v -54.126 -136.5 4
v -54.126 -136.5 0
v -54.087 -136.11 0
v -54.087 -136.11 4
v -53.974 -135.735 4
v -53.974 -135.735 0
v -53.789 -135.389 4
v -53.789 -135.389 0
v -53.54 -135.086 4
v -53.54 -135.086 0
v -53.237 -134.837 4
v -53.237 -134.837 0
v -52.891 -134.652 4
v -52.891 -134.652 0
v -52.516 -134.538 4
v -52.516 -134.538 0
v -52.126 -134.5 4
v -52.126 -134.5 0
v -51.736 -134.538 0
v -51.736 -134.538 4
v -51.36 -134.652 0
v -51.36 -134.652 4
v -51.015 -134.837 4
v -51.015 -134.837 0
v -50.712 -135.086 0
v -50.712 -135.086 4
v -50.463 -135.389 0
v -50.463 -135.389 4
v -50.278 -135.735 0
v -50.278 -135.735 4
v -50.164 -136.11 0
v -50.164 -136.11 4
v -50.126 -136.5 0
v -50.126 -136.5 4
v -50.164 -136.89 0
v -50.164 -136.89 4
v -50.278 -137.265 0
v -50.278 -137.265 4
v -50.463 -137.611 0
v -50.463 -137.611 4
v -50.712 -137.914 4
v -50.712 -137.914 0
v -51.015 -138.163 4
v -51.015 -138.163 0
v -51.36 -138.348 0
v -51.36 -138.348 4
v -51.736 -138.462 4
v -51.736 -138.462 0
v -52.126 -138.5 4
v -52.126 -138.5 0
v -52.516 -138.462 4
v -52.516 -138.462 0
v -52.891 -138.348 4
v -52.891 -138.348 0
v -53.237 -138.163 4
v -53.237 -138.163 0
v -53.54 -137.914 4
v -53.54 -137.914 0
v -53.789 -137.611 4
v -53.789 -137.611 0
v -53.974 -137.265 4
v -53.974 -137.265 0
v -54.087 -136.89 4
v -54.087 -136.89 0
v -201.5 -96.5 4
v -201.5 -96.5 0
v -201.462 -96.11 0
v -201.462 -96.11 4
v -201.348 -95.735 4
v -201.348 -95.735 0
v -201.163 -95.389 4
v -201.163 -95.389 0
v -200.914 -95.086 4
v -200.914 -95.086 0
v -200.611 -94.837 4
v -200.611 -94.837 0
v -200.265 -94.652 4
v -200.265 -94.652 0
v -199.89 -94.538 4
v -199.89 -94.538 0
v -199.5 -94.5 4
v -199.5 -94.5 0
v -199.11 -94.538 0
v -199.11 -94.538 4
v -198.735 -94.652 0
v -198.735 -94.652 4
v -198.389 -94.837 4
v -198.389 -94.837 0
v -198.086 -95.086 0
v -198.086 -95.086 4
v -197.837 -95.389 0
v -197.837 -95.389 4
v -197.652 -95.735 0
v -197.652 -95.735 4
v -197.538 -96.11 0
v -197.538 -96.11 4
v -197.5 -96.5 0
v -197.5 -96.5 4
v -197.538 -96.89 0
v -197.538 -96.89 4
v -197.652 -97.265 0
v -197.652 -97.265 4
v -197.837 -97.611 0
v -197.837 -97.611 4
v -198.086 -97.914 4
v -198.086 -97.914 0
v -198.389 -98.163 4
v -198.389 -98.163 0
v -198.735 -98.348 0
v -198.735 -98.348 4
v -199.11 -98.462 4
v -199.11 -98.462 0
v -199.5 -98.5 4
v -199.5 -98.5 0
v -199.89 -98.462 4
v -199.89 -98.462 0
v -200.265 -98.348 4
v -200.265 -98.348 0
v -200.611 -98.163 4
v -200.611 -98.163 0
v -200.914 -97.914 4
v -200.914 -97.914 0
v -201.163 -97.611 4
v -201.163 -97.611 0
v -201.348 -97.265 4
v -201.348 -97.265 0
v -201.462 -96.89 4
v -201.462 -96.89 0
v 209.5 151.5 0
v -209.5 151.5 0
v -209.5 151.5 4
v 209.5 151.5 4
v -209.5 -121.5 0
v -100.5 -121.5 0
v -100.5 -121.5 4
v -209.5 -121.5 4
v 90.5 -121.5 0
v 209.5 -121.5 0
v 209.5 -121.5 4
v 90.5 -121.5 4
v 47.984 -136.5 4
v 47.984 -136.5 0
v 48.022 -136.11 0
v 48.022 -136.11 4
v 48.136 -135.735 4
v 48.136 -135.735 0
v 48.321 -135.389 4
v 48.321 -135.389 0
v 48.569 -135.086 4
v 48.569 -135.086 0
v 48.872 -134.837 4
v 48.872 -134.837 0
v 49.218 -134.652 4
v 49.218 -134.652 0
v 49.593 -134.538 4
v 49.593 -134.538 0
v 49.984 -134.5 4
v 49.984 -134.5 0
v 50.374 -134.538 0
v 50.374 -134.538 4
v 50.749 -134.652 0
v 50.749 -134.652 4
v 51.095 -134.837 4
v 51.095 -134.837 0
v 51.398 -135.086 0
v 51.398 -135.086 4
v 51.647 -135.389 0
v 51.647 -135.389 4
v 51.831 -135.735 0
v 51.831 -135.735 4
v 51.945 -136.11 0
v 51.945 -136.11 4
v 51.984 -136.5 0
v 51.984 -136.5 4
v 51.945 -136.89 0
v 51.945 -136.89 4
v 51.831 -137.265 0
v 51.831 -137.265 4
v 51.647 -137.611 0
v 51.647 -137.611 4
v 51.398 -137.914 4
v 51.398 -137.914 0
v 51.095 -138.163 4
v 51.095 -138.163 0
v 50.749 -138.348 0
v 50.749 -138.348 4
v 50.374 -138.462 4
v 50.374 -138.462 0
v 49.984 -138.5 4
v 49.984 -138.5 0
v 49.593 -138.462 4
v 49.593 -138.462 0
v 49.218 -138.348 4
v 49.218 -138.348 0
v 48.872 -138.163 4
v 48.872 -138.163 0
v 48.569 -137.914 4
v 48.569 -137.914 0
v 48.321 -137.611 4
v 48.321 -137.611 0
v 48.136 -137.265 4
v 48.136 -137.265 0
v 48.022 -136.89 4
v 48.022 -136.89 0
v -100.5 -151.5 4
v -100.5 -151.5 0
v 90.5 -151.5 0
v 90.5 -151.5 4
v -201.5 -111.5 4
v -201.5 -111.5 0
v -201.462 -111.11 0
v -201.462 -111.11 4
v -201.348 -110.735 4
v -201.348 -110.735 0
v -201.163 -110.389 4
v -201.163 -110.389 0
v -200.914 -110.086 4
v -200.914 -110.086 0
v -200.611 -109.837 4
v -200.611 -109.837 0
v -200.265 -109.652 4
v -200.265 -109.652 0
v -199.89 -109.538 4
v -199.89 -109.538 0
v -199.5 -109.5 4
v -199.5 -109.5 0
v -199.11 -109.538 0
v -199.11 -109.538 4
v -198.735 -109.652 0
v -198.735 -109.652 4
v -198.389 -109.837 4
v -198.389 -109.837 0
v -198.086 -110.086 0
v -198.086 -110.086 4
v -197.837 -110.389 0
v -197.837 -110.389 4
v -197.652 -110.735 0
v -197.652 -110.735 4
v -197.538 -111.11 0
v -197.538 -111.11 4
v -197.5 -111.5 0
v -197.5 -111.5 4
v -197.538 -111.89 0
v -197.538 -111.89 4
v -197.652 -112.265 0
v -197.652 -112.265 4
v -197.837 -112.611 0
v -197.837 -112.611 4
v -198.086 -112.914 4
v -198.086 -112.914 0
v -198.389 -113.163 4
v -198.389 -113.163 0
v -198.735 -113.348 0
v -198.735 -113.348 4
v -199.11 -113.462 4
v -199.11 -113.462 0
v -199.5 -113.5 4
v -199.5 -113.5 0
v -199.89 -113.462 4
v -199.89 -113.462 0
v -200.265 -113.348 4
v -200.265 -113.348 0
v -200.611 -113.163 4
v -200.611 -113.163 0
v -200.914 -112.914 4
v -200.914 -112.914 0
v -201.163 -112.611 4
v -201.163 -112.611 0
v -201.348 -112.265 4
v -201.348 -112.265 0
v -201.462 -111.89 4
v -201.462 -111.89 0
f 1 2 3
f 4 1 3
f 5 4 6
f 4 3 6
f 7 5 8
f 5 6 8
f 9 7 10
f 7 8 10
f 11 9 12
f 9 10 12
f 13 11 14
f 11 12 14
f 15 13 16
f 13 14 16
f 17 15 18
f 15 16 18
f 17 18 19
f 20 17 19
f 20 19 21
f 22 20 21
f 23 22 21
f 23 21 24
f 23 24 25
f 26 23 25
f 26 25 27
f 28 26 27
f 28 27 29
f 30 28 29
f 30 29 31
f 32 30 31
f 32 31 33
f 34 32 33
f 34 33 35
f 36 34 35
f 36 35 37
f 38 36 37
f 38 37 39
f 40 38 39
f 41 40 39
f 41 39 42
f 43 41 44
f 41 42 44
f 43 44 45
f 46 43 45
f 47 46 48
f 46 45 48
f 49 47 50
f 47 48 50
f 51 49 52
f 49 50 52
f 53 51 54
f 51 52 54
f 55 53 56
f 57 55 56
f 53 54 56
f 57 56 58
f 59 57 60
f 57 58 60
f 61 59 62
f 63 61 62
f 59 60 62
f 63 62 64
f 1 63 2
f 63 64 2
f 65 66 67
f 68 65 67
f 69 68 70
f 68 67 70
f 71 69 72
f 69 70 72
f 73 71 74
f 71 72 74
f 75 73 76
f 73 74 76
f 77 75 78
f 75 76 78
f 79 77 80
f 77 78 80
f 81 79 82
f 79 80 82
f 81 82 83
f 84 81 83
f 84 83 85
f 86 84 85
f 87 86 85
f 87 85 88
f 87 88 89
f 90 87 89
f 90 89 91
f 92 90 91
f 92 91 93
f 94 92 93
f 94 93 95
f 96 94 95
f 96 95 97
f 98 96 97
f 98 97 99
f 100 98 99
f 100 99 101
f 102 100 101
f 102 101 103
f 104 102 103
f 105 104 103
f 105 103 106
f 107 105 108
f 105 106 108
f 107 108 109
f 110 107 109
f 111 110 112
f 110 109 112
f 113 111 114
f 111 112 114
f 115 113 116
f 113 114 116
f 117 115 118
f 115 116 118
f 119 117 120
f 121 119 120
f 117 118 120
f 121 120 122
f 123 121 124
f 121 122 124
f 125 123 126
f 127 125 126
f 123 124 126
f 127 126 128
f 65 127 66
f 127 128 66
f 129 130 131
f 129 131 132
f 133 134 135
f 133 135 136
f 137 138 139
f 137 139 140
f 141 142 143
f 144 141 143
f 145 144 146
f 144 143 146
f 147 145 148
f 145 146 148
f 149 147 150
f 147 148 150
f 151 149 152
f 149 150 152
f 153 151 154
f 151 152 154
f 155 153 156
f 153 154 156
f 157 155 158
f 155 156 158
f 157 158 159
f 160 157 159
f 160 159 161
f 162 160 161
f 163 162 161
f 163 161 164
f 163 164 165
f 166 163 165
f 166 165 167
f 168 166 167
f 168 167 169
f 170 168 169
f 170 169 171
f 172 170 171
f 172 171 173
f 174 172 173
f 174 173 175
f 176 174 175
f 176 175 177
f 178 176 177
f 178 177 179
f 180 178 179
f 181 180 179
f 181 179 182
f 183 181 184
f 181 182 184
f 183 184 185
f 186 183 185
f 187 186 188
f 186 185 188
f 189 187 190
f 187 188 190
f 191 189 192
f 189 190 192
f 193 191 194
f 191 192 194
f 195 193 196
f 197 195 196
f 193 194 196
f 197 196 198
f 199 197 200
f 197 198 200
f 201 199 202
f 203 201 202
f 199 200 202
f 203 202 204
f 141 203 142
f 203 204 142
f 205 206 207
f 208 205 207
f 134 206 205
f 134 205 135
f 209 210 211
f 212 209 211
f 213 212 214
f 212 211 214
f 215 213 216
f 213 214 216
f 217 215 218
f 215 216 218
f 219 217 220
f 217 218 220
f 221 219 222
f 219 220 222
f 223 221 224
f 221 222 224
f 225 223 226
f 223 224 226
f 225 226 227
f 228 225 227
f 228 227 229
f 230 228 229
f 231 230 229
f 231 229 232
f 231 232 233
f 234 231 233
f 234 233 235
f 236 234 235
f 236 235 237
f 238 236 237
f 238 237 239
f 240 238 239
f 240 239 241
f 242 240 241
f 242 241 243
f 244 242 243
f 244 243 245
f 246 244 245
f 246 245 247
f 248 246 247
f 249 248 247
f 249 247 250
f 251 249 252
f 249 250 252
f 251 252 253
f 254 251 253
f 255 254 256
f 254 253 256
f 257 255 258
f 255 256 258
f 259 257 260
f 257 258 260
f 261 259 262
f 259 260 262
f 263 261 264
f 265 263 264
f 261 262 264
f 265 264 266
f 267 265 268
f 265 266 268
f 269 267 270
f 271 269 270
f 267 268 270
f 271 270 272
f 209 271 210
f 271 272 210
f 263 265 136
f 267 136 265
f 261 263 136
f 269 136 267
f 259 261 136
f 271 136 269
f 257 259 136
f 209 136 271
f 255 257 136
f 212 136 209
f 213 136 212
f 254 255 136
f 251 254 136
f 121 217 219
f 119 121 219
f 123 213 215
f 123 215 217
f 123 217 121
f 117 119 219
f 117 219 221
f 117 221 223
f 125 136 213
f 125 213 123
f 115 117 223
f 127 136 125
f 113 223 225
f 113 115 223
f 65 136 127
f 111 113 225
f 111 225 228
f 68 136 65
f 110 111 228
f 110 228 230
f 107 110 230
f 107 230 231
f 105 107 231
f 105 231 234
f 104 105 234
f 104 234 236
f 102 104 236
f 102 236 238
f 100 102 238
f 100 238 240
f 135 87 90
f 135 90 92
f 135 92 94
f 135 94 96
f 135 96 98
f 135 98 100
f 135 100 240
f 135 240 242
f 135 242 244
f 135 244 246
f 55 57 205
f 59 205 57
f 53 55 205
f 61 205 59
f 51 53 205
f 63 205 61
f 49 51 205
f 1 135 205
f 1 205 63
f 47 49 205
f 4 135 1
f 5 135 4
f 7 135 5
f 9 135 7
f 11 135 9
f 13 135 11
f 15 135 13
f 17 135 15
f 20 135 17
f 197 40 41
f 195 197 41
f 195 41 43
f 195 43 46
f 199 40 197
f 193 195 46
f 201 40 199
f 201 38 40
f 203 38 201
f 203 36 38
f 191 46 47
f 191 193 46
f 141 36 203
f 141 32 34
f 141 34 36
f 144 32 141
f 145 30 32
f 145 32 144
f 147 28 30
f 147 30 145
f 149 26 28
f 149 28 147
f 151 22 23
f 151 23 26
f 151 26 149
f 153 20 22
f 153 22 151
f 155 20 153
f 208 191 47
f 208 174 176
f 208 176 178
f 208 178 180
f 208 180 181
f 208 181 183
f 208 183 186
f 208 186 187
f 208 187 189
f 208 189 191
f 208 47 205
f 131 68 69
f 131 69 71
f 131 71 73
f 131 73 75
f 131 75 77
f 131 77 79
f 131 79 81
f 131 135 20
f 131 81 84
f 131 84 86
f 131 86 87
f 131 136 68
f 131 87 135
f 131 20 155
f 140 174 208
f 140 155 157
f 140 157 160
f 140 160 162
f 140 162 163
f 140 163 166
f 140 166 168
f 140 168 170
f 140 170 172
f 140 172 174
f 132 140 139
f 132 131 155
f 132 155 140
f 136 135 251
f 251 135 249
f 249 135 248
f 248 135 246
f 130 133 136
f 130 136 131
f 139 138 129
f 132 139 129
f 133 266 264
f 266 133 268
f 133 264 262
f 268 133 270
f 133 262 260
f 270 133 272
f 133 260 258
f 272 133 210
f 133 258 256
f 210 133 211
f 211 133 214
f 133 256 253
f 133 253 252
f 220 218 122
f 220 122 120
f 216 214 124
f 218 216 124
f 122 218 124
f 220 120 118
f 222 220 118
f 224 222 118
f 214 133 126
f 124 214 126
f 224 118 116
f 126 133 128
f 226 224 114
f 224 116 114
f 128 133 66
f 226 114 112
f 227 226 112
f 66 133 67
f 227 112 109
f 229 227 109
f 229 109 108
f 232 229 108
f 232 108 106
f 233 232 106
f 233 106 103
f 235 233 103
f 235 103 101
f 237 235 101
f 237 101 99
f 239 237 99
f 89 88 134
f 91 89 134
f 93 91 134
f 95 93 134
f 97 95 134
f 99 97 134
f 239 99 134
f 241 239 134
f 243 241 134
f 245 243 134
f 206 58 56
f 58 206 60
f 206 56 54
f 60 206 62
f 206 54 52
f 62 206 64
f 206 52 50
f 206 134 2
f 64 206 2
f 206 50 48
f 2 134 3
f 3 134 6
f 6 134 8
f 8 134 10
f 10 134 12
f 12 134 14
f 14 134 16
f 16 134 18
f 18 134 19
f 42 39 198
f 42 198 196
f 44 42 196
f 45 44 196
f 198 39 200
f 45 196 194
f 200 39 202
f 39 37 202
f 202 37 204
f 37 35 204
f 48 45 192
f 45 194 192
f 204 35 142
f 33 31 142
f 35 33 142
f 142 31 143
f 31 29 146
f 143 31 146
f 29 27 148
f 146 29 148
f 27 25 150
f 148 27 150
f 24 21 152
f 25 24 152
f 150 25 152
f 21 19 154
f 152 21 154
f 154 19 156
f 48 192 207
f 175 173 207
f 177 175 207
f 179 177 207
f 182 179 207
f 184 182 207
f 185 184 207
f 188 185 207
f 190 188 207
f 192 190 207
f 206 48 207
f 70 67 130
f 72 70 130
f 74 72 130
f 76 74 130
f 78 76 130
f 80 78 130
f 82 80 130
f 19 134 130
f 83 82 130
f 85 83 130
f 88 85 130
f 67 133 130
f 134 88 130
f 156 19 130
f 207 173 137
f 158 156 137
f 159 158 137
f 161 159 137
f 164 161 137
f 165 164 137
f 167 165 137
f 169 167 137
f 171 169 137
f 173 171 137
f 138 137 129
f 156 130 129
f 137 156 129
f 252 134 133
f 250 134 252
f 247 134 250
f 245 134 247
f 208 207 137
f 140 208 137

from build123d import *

# Parameters (mm, degrees)
SKETCH1_W           = 419
SKETCH1_H           = 303
BOSS_EXTRUDE1_DEPTH = 4
SKETCH2_W           = 119
SKETCH2_H           = 30
SKETCH2_W_2         = 109
CUT_EXTRUDE1_DEPTH  = 4
SKETCH3_R           = 2
CUT_EXTRUDE2_DEPTH  = 259.570106548
SKETCH4_R           = 2
CUT_EXTRUDE3_DEPTH  = 259.570106548


with BuildPart() as part:
    # Sketch1 → Boss-Extrude1 (new body)
    with BuildSketch(Plane.XY):
        Rectangle(SKETCH1_W, SKETCH1_H)
    extrude(amount=BOSS_EXTRUDE1_DEPTH)

    # Sketch2 → Cut-Extrude1 (cut)
    with BuildSketch(Plane(origin=(0, 0, 0), x_dir=(-1, 0, 0), z_dir=(0, 0, -1))):
        with Locations((-150, -136.5)):
            Rectangle(SKETCH2_W, SKETCH2_H)
        with Locations((155, -136.5)):
            Rectangle(SKETCH2_W_2, SKETCH2_H)
    extrude(amount=-CUT_EXTRUDE1_DEPTH, mode=Mode.SUBTRACT)

    # Sketch3 → Cut-Extrude2 (cut, through all)
    with BuildSketch(Plane(origin=(0, 0, 0), x_dir=(-1, 0, 0), z_dir=(0, 0, -1))):
        with Locations((-49.983602513, -136.5)):
            Circle(SKETCH3_R)
        with Locations((52.125756906, -136.5)):
            Circle(SKETCH3_R)
    extrude(amount=-CUT_EXTRUDE2_DEPTH, mode=Mode.SUBTRACT)

    # Sketch4 → Cut-Extrude3 (cut, through all)
    with BuildSketch(Plane(origin=(0, 0, 0), x_dir=(-1, 0, 0), z_dir=(0, 0, -1))):
        with Locations((199.5, -111.5)):
            Circle(SKETCH4_R)
        with Locations((199.5, -96.5)):
            Circle(SKETCH4_R)
    extrude(amount=-CUT_EXTRUDE3_DEPTH, mode=Mode.SUBTRACT)


solid = part.part
